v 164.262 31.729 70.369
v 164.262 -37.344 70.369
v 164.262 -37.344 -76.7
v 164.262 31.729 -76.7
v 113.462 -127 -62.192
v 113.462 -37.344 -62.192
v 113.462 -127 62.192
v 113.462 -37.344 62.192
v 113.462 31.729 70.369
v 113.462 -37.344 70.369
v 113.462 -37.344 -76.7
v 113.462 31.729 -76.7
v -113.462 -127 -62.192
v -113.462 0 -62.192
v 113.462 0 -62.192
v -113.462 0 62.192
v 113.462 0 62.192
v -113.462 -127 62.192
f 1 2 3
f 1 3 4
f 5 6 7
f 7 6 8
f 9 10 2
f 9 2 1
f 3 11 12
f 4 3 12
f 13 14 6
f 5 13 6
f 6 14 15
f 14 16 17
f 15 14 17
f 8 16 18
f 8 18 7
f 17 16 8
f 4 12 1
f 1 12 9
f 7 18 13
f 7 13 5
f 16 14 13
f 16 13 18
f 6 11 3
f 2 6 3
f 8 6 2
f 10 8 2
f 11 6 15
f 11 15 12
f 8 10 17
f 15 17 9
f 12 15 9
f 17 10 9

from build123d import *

# Parameters (mm, degrees)
F0_W     = 226.923436
F0_H     = 124.384374
F1_DEPTH = 127
F2_W     = 69.073379
F2_H     = 147.068739
F3_DEPTH = 50.8


with BuildPart() as f1:
    # F0 (on Front) → F1 (new body)
    with BuildSketch(Plane.XZ):
        Rectangle(F0_W, F0_H)
    extrude(amount=F1_DEPTH)

    # F2 (on face) → F3 (join)
    with BuildSketch(Plane.YZ.offset(113.461718)):
        with Locations((-2.807253, -3.165864)):
            Rectangle(F2_W, F2_H)
    extrude(amount=F3_DEPTH)


solid = f1.part
